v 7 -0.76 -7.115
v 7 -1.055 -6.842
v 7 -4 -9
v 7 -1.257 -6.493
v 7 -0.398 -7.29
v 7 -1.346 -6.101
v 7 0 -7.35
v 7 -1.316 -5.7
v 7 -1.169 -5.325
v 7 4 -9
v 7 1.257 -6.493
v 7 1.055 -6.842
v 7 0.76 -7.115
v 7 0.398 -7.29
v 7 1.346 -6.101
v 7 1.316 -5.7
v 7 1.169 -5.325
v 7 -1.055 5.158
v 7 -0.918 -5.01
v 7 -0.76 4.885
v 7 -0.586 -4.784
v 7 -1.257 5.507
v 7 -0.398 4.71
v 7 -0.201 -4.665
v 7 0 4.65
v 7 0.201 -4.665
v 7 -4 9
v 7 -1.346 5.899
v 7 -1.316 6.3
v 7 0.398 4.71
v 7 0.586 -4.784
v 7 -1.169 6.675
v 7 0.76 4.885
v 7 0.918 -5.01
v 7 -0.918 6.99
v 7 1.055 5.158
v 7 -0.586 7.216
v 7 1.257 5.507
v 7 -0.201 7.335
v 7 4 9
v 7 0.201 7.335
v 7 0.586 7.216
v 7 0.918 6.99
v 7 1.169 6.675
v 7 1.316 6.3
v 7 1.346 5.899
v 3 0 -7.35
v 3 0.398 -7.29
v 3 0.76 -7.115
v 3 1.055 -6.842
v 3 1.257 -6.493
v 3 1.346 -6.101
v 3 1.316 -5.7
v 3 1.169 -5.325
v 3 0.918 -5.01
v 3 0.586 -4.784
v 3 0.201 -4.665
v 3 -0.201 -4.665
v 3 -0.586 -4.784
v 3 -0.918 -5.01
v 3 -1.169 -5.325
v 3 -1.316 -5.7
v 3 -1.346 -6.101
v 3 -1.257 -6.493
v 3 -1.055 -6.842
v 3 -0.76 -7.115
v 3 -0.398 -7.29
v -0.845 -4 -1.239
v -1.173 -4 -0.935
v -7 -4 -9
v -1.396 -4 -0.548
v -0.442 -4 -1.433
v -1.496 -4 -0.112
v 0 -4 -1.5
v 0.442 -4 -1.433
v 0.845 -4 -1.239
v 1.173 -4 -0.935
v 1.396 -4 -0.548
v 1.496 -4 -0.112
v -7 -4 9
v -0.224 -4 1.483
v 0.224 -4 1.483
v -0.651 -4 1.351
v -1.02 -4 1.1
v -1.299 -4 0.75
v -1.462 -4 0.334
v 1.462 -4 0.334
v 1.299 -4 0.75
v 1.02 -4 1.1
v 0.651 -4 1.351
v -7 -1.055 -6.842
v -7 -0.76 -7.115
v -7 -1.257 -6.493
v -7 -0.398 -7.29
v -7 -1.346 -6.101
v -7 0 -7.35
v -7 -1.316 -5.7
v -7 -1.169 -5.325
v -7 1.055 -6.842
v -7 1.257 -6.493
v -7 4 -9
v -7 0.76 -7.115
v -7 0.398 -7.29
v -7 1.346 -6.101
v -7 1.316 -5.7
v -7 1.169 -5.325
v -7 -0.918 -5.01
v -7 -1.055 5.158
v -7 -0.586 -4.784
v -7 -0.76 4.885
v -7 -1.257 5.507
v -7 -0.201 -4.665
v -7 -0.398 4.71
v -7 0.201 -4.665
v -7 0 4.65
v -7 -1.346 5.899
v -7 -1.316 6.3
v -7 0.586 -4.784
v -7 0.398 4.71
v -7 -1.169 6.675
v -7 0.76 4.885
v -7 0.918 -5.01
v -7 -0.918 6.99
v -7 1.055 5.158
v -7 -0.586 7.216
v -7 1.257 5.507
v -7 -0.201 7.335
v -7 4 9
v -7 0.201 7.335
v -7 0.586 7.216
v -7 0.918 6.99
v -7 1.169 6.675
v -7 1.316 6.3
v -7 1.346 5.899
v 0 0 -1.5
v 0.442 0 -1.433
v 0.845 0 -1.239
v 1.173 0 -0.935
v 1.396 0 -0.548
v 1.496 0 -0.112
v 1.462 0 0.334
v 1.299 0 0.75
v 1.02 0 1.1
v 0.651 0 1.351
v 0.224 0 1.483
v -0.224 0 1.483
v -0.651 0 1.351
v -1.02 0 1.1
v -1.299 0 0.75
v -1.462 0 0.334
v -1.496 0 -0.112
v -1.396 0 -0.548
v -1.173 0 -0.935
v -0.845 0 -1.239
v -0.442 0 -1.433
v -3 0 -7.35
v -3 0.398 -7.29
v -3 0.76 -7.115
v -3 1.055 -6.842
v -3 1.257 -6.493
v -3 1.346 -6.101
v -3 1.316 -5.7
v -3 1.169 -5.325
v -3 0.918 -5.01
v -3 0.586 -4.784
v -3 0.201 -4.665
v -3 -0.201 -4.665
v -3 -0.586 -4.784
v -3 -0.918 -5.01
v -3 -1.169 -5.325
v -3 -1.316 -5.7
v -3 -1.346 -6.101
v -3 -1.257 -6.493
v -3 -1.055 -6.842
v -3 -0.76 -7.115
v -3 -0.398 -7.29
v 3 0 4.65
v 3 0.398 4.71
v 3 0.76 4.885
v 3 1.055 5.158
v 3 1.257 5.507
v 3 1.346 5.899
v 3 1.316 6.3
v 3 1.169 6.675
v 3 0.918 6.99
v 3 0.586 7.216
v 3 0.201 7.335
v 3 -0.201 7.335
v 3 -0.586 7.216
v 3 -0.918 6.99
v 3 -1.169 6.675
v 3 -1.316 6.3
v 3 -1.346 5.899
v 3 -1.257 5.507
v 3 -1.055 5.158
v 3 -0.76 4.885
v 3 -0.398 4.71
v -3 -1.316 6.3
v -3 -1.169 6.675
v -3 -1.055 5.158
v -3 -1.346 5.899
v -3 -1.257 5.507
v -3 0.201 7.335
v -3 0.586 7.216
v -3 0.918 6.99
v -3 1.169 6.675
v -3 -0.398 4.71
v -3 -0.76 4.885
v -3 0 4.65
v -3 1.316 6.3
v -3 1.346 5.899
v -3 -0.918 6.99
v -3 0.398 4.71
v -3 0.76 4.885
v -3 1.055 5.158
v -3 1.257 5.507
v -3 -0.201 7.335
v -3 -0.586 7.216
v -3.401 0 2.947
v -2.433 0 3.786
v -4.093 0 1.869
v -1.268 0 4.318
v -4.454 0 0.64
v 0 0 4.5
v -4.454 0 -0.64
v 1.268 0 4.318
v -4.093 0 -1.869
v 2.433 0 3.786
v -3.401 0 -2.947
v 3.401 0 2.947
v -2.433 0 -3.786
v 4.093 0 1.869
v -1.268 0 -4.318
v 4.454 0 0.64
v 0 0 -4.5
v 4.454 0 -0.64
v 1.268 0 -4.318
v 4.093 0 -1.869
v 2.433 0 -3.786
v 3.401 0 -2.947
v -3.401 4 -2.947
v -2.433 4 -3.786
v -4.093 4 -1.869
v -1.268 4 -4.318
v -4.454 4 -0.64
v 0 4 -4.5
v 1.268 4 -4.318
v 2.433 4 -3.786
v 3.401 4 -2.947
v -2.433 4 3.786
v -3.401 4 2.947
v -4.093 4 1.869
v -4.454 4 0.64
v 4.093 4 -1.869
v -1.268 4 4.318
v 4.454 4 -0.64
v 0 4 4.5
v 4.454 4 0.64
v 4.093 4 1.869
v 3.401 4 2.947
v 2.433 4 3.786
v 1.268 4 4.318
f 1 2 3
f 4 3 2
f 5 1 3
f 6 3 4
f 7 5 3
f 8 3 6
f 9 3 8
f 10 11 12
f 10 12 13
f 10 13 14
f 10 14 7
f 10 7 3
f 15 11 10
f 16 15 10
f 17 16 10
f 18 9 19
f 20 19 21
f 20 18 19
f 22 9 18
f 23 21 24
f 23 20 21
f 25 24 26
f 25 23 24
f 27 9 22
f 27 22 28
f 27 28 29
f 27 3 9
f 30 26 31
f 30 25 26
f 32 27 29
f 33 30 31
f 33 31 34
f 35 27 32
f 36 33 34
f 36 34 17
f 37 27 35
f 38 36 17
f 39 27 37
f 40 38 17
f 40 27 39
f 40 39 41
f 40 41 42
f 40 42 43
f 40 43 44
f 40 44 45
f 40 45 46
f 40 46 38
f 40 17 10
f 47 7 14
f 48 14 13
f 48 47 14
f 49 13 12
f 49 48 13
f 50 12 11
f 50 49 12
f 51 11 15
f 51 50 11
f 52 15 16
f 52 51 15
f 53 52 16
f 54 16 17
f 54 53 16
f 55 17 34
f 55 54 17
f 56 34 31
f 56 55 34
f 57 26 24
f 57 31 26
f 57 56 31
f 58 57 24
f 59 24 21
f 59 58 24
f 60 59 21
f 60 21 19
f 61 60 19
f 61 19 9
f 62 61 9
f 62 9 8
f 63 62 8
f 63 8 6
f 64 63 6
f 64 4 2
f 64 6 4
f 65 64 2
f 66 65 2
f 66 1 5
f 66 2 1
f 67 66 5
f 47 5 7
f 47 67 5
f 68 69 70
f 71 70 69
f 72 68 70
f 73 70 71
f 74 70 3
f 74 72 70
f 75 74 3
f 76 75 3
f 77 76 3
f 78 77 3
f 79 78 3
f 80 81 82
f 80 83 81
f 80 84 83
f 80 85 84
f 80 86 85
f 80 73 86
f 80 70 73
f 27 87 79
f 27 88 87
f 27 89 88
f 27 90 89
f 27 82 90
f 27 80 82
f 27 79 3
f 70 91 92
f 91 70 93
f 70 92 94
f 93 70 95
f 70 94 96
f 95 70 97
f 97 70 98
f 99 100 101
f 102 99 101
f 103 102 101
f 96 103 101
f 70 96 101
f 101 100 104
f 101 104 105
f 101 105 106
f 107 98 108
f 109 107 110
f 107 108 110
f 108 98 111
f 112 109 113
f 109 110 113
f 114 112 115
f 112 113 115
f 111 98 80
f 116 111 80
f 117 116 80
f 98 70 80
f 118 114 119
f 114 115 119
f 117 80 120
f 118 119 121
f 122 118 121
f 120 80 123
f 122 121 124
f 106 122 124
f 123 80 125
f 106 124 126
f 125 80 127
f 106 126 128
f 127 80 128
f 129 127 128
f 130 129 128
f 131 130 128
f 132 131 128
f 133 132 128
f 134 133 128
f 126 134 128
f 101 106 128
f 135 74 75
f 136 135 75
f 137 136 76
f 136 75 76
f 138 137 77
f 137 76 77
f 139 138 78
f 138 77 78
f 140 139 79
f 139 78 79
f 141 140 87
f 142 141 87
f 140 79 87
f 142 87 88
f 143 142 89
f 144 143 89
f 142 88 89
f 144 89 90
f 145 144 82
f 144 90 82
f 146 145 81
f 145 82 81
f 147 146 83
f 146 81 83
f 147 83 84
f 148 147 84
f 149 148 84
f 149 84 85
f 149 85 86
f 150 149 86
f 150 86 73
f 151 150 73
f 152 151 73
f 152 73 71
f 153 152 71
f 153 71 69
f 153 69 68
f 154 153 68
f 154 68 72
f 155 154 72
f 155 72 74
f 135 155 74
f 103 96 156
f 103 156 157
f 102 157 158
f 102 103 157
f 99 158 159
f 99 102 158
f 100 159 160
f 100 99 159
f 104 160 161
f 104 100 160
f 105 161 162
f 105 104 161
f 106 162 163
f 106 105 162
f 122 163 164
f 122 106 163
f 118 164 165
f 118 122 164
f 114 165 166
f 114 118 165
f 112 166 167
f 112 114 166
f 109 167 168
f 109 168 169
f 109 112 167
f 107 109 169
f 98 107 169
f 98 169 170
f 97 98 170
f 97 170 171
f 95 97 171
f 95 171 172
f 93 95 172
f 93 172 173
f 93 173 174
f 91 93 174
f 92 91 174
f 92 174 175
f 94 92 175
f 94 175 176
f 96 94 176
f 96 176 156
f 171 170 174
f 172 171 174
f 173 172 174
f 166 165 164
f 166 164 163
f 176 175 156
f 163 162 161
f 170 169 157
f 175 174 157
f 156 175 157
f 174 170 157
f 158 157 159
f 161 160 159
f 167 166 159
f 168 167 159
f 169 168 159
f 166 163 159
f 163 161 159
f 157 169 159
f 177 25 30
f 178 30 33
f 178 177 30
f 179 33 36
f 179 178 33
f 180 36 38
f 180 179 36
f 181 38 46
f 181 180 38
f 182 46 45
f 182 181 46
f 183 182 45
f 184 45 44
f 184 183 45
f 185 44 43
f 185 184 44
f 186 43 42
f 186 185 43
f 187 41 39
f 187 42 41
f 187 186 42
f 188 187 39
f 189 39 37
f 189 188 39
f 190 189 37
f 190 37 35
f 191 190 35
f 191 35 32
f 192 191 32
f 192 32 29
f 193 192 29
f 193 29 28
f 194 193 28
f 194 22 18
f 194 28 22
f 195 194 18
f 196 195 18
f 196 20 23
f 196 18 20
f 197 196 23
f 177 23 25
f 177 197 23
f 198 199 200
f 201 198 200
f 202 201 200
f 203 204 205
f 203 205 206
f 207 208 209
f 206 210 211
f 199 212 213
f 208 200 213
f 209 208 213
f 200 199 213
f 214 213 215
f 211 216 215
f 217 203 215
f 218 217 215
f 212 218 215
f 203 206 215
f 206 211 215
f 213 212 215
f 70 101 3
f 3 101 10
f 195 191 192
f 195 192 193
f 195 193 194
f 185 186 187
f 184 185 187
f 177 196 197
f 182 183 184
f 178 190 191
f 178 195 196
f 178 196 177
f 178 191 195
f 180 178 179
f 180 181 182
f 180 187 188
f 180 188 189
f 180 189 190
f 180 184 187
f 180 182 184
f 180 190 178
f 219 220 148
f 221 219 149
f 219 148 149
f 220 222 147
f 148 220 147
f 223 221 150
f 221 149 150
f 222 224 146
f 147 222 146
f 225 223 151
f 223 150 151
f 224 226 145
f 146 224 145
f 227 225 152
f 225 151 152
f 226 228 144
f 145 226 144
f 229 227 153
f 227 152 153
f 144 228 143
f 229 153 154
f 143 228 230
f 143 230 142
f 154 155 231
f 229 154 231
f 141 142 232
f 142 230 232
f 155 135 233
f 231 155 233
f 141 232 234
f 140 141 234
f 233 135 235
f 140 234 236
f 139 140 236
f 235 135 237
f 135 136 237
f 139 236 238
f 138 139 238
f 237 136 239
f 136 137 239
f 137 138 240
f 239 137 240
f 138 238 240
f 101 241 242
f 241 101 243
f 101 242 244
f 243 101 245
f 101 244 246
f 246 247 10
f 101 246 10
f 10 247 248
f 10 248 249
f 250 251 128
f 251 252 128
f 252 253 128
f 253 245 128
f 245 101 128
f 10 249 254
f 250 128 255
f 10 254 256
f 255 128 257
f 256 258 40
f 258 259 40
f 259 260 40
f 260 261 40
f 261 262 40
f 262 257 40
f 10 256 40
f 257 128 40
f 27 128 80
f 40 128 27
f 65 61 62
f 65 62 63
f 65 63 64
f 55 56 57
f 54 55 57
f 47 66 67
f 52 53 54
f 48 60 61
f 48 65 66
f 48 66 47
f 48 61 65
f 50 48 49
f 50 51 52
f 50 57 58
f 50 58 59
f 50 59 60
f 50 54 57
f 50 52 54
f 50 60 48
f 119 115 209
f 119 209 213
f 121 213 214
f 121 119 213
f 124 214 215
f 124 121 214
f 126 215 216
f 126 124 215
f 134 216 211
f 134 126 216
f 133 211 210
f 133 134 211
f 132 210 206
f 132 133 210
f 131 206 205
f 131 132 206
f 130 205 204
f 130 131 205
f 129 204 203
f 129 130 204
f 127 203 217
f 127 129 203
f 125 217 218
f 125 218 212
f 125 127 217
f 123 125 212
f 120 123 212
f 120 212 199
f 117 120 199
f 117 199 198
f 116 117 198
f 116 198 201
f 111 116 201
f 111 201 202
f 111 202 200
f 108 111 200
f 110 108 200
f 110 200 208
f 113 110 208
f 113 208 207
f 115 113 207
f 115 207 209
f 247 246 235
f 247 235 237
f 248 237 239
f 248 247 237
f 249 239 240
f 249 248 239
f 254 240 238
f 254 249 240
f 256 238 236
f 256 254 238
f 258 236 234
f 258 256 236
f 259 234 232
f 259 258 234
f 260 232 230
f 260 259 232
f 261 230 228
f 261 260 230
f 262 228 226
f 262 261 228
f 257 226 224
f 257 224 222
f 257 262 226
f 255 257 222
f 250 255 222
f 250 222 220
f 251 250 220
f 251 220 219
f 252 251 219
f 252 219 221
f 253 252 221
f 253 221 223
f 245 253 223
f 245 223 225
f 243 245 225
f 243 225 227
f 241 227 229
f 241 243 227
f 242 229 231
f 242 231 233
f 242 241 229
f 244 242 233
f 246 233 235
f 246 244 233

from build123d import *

# Parameters (mm, degrees)
SKETCH_2_W               = 14
SKETCH_2_H               = 8
EXTRUDE_2_DEPTH          = 9
CUT_EXTRUDE_1_DEPTH      = 13.083045974
CUT_EXTRUDE_1_DEPTH_BACK = 13.083045974
SKETCH_3_R               = 1.35
SKETCH_3_2_R             = 1.35
EXTRUDE_3_DEPTH          = 3
SKETCH_6_R               = 1.5
CUT_EXTRUDE_3_DEPTH      = 10
SKETCH_7_R               = 4.5
CUT_EXTRUDE_4_DEPTH      = 4


with BuildPart() as part:
    # 草图2 → 凸台-拉伸2 (new, symmetric)
    with BuildSketch(Plane.XY):
        Rectangle(SKETCH_2_W, SKETCH_2_H)
    extrude(amount=EXTRUDE_2_DEPTH, both=True)

    # 草图3 → 切除-拉伸1 (cut, two sides: drawn at the far end of the back side and taken through both)
    with BuildSketch(Plane(origin=(0, 0, 0), x_dir=(0, 0, -1), z_dir=(1, 0, 0)).offset(-CUT_EXTRUDE_1_DEPTH_BACK)):
        with Locations((6, 0)):
            Circle(SKETCH_3_R)
        with Locations((-6, 0)):
            Circle(SKETCH_3_R)
    extrude(amount=CUT_EXTRUDE_1_DEPTH + CUT_EXTRUDE_1_DEPTH_BACK, mode=Mode.SUBTRACT)

    # 草图3<2> → 凸台-拉伸3 (add, symmetric)
    with BuildSketch(Plane(origin=(0, 0, 0), x_dir=(0, 0, -1), z_dir=(1, 0, 0))):
        with Locations((6, 0)):
            Circle(SKETCH_3_2_R)
        with Locations((-6, 0)):
            Circle(SKETCH_3_2_R)
    extrude(amount=EXTRUDE_3_DEPTH, both=True)

    # 草图6 → 切除-拉伸3 (cut)
    with BuildSketch(Plane.XZ.offset(4)):
        Circle(SKETCH_6_R)
    extrude(amount=-CUT_EXTRUDE_3_DEPTH, mode=Mode.SUBTRACT)

    # 草图7 → 切除-拉伸4 (cut)
    with BuildSketch(Plane.XZ.offset(-4)):
        Circle(SKETCH_7_R)
    extrude(amount=CUT_EXTRUDE_4_DEPTH, mode=Mode.SUBTRACT)


solid = part.part
